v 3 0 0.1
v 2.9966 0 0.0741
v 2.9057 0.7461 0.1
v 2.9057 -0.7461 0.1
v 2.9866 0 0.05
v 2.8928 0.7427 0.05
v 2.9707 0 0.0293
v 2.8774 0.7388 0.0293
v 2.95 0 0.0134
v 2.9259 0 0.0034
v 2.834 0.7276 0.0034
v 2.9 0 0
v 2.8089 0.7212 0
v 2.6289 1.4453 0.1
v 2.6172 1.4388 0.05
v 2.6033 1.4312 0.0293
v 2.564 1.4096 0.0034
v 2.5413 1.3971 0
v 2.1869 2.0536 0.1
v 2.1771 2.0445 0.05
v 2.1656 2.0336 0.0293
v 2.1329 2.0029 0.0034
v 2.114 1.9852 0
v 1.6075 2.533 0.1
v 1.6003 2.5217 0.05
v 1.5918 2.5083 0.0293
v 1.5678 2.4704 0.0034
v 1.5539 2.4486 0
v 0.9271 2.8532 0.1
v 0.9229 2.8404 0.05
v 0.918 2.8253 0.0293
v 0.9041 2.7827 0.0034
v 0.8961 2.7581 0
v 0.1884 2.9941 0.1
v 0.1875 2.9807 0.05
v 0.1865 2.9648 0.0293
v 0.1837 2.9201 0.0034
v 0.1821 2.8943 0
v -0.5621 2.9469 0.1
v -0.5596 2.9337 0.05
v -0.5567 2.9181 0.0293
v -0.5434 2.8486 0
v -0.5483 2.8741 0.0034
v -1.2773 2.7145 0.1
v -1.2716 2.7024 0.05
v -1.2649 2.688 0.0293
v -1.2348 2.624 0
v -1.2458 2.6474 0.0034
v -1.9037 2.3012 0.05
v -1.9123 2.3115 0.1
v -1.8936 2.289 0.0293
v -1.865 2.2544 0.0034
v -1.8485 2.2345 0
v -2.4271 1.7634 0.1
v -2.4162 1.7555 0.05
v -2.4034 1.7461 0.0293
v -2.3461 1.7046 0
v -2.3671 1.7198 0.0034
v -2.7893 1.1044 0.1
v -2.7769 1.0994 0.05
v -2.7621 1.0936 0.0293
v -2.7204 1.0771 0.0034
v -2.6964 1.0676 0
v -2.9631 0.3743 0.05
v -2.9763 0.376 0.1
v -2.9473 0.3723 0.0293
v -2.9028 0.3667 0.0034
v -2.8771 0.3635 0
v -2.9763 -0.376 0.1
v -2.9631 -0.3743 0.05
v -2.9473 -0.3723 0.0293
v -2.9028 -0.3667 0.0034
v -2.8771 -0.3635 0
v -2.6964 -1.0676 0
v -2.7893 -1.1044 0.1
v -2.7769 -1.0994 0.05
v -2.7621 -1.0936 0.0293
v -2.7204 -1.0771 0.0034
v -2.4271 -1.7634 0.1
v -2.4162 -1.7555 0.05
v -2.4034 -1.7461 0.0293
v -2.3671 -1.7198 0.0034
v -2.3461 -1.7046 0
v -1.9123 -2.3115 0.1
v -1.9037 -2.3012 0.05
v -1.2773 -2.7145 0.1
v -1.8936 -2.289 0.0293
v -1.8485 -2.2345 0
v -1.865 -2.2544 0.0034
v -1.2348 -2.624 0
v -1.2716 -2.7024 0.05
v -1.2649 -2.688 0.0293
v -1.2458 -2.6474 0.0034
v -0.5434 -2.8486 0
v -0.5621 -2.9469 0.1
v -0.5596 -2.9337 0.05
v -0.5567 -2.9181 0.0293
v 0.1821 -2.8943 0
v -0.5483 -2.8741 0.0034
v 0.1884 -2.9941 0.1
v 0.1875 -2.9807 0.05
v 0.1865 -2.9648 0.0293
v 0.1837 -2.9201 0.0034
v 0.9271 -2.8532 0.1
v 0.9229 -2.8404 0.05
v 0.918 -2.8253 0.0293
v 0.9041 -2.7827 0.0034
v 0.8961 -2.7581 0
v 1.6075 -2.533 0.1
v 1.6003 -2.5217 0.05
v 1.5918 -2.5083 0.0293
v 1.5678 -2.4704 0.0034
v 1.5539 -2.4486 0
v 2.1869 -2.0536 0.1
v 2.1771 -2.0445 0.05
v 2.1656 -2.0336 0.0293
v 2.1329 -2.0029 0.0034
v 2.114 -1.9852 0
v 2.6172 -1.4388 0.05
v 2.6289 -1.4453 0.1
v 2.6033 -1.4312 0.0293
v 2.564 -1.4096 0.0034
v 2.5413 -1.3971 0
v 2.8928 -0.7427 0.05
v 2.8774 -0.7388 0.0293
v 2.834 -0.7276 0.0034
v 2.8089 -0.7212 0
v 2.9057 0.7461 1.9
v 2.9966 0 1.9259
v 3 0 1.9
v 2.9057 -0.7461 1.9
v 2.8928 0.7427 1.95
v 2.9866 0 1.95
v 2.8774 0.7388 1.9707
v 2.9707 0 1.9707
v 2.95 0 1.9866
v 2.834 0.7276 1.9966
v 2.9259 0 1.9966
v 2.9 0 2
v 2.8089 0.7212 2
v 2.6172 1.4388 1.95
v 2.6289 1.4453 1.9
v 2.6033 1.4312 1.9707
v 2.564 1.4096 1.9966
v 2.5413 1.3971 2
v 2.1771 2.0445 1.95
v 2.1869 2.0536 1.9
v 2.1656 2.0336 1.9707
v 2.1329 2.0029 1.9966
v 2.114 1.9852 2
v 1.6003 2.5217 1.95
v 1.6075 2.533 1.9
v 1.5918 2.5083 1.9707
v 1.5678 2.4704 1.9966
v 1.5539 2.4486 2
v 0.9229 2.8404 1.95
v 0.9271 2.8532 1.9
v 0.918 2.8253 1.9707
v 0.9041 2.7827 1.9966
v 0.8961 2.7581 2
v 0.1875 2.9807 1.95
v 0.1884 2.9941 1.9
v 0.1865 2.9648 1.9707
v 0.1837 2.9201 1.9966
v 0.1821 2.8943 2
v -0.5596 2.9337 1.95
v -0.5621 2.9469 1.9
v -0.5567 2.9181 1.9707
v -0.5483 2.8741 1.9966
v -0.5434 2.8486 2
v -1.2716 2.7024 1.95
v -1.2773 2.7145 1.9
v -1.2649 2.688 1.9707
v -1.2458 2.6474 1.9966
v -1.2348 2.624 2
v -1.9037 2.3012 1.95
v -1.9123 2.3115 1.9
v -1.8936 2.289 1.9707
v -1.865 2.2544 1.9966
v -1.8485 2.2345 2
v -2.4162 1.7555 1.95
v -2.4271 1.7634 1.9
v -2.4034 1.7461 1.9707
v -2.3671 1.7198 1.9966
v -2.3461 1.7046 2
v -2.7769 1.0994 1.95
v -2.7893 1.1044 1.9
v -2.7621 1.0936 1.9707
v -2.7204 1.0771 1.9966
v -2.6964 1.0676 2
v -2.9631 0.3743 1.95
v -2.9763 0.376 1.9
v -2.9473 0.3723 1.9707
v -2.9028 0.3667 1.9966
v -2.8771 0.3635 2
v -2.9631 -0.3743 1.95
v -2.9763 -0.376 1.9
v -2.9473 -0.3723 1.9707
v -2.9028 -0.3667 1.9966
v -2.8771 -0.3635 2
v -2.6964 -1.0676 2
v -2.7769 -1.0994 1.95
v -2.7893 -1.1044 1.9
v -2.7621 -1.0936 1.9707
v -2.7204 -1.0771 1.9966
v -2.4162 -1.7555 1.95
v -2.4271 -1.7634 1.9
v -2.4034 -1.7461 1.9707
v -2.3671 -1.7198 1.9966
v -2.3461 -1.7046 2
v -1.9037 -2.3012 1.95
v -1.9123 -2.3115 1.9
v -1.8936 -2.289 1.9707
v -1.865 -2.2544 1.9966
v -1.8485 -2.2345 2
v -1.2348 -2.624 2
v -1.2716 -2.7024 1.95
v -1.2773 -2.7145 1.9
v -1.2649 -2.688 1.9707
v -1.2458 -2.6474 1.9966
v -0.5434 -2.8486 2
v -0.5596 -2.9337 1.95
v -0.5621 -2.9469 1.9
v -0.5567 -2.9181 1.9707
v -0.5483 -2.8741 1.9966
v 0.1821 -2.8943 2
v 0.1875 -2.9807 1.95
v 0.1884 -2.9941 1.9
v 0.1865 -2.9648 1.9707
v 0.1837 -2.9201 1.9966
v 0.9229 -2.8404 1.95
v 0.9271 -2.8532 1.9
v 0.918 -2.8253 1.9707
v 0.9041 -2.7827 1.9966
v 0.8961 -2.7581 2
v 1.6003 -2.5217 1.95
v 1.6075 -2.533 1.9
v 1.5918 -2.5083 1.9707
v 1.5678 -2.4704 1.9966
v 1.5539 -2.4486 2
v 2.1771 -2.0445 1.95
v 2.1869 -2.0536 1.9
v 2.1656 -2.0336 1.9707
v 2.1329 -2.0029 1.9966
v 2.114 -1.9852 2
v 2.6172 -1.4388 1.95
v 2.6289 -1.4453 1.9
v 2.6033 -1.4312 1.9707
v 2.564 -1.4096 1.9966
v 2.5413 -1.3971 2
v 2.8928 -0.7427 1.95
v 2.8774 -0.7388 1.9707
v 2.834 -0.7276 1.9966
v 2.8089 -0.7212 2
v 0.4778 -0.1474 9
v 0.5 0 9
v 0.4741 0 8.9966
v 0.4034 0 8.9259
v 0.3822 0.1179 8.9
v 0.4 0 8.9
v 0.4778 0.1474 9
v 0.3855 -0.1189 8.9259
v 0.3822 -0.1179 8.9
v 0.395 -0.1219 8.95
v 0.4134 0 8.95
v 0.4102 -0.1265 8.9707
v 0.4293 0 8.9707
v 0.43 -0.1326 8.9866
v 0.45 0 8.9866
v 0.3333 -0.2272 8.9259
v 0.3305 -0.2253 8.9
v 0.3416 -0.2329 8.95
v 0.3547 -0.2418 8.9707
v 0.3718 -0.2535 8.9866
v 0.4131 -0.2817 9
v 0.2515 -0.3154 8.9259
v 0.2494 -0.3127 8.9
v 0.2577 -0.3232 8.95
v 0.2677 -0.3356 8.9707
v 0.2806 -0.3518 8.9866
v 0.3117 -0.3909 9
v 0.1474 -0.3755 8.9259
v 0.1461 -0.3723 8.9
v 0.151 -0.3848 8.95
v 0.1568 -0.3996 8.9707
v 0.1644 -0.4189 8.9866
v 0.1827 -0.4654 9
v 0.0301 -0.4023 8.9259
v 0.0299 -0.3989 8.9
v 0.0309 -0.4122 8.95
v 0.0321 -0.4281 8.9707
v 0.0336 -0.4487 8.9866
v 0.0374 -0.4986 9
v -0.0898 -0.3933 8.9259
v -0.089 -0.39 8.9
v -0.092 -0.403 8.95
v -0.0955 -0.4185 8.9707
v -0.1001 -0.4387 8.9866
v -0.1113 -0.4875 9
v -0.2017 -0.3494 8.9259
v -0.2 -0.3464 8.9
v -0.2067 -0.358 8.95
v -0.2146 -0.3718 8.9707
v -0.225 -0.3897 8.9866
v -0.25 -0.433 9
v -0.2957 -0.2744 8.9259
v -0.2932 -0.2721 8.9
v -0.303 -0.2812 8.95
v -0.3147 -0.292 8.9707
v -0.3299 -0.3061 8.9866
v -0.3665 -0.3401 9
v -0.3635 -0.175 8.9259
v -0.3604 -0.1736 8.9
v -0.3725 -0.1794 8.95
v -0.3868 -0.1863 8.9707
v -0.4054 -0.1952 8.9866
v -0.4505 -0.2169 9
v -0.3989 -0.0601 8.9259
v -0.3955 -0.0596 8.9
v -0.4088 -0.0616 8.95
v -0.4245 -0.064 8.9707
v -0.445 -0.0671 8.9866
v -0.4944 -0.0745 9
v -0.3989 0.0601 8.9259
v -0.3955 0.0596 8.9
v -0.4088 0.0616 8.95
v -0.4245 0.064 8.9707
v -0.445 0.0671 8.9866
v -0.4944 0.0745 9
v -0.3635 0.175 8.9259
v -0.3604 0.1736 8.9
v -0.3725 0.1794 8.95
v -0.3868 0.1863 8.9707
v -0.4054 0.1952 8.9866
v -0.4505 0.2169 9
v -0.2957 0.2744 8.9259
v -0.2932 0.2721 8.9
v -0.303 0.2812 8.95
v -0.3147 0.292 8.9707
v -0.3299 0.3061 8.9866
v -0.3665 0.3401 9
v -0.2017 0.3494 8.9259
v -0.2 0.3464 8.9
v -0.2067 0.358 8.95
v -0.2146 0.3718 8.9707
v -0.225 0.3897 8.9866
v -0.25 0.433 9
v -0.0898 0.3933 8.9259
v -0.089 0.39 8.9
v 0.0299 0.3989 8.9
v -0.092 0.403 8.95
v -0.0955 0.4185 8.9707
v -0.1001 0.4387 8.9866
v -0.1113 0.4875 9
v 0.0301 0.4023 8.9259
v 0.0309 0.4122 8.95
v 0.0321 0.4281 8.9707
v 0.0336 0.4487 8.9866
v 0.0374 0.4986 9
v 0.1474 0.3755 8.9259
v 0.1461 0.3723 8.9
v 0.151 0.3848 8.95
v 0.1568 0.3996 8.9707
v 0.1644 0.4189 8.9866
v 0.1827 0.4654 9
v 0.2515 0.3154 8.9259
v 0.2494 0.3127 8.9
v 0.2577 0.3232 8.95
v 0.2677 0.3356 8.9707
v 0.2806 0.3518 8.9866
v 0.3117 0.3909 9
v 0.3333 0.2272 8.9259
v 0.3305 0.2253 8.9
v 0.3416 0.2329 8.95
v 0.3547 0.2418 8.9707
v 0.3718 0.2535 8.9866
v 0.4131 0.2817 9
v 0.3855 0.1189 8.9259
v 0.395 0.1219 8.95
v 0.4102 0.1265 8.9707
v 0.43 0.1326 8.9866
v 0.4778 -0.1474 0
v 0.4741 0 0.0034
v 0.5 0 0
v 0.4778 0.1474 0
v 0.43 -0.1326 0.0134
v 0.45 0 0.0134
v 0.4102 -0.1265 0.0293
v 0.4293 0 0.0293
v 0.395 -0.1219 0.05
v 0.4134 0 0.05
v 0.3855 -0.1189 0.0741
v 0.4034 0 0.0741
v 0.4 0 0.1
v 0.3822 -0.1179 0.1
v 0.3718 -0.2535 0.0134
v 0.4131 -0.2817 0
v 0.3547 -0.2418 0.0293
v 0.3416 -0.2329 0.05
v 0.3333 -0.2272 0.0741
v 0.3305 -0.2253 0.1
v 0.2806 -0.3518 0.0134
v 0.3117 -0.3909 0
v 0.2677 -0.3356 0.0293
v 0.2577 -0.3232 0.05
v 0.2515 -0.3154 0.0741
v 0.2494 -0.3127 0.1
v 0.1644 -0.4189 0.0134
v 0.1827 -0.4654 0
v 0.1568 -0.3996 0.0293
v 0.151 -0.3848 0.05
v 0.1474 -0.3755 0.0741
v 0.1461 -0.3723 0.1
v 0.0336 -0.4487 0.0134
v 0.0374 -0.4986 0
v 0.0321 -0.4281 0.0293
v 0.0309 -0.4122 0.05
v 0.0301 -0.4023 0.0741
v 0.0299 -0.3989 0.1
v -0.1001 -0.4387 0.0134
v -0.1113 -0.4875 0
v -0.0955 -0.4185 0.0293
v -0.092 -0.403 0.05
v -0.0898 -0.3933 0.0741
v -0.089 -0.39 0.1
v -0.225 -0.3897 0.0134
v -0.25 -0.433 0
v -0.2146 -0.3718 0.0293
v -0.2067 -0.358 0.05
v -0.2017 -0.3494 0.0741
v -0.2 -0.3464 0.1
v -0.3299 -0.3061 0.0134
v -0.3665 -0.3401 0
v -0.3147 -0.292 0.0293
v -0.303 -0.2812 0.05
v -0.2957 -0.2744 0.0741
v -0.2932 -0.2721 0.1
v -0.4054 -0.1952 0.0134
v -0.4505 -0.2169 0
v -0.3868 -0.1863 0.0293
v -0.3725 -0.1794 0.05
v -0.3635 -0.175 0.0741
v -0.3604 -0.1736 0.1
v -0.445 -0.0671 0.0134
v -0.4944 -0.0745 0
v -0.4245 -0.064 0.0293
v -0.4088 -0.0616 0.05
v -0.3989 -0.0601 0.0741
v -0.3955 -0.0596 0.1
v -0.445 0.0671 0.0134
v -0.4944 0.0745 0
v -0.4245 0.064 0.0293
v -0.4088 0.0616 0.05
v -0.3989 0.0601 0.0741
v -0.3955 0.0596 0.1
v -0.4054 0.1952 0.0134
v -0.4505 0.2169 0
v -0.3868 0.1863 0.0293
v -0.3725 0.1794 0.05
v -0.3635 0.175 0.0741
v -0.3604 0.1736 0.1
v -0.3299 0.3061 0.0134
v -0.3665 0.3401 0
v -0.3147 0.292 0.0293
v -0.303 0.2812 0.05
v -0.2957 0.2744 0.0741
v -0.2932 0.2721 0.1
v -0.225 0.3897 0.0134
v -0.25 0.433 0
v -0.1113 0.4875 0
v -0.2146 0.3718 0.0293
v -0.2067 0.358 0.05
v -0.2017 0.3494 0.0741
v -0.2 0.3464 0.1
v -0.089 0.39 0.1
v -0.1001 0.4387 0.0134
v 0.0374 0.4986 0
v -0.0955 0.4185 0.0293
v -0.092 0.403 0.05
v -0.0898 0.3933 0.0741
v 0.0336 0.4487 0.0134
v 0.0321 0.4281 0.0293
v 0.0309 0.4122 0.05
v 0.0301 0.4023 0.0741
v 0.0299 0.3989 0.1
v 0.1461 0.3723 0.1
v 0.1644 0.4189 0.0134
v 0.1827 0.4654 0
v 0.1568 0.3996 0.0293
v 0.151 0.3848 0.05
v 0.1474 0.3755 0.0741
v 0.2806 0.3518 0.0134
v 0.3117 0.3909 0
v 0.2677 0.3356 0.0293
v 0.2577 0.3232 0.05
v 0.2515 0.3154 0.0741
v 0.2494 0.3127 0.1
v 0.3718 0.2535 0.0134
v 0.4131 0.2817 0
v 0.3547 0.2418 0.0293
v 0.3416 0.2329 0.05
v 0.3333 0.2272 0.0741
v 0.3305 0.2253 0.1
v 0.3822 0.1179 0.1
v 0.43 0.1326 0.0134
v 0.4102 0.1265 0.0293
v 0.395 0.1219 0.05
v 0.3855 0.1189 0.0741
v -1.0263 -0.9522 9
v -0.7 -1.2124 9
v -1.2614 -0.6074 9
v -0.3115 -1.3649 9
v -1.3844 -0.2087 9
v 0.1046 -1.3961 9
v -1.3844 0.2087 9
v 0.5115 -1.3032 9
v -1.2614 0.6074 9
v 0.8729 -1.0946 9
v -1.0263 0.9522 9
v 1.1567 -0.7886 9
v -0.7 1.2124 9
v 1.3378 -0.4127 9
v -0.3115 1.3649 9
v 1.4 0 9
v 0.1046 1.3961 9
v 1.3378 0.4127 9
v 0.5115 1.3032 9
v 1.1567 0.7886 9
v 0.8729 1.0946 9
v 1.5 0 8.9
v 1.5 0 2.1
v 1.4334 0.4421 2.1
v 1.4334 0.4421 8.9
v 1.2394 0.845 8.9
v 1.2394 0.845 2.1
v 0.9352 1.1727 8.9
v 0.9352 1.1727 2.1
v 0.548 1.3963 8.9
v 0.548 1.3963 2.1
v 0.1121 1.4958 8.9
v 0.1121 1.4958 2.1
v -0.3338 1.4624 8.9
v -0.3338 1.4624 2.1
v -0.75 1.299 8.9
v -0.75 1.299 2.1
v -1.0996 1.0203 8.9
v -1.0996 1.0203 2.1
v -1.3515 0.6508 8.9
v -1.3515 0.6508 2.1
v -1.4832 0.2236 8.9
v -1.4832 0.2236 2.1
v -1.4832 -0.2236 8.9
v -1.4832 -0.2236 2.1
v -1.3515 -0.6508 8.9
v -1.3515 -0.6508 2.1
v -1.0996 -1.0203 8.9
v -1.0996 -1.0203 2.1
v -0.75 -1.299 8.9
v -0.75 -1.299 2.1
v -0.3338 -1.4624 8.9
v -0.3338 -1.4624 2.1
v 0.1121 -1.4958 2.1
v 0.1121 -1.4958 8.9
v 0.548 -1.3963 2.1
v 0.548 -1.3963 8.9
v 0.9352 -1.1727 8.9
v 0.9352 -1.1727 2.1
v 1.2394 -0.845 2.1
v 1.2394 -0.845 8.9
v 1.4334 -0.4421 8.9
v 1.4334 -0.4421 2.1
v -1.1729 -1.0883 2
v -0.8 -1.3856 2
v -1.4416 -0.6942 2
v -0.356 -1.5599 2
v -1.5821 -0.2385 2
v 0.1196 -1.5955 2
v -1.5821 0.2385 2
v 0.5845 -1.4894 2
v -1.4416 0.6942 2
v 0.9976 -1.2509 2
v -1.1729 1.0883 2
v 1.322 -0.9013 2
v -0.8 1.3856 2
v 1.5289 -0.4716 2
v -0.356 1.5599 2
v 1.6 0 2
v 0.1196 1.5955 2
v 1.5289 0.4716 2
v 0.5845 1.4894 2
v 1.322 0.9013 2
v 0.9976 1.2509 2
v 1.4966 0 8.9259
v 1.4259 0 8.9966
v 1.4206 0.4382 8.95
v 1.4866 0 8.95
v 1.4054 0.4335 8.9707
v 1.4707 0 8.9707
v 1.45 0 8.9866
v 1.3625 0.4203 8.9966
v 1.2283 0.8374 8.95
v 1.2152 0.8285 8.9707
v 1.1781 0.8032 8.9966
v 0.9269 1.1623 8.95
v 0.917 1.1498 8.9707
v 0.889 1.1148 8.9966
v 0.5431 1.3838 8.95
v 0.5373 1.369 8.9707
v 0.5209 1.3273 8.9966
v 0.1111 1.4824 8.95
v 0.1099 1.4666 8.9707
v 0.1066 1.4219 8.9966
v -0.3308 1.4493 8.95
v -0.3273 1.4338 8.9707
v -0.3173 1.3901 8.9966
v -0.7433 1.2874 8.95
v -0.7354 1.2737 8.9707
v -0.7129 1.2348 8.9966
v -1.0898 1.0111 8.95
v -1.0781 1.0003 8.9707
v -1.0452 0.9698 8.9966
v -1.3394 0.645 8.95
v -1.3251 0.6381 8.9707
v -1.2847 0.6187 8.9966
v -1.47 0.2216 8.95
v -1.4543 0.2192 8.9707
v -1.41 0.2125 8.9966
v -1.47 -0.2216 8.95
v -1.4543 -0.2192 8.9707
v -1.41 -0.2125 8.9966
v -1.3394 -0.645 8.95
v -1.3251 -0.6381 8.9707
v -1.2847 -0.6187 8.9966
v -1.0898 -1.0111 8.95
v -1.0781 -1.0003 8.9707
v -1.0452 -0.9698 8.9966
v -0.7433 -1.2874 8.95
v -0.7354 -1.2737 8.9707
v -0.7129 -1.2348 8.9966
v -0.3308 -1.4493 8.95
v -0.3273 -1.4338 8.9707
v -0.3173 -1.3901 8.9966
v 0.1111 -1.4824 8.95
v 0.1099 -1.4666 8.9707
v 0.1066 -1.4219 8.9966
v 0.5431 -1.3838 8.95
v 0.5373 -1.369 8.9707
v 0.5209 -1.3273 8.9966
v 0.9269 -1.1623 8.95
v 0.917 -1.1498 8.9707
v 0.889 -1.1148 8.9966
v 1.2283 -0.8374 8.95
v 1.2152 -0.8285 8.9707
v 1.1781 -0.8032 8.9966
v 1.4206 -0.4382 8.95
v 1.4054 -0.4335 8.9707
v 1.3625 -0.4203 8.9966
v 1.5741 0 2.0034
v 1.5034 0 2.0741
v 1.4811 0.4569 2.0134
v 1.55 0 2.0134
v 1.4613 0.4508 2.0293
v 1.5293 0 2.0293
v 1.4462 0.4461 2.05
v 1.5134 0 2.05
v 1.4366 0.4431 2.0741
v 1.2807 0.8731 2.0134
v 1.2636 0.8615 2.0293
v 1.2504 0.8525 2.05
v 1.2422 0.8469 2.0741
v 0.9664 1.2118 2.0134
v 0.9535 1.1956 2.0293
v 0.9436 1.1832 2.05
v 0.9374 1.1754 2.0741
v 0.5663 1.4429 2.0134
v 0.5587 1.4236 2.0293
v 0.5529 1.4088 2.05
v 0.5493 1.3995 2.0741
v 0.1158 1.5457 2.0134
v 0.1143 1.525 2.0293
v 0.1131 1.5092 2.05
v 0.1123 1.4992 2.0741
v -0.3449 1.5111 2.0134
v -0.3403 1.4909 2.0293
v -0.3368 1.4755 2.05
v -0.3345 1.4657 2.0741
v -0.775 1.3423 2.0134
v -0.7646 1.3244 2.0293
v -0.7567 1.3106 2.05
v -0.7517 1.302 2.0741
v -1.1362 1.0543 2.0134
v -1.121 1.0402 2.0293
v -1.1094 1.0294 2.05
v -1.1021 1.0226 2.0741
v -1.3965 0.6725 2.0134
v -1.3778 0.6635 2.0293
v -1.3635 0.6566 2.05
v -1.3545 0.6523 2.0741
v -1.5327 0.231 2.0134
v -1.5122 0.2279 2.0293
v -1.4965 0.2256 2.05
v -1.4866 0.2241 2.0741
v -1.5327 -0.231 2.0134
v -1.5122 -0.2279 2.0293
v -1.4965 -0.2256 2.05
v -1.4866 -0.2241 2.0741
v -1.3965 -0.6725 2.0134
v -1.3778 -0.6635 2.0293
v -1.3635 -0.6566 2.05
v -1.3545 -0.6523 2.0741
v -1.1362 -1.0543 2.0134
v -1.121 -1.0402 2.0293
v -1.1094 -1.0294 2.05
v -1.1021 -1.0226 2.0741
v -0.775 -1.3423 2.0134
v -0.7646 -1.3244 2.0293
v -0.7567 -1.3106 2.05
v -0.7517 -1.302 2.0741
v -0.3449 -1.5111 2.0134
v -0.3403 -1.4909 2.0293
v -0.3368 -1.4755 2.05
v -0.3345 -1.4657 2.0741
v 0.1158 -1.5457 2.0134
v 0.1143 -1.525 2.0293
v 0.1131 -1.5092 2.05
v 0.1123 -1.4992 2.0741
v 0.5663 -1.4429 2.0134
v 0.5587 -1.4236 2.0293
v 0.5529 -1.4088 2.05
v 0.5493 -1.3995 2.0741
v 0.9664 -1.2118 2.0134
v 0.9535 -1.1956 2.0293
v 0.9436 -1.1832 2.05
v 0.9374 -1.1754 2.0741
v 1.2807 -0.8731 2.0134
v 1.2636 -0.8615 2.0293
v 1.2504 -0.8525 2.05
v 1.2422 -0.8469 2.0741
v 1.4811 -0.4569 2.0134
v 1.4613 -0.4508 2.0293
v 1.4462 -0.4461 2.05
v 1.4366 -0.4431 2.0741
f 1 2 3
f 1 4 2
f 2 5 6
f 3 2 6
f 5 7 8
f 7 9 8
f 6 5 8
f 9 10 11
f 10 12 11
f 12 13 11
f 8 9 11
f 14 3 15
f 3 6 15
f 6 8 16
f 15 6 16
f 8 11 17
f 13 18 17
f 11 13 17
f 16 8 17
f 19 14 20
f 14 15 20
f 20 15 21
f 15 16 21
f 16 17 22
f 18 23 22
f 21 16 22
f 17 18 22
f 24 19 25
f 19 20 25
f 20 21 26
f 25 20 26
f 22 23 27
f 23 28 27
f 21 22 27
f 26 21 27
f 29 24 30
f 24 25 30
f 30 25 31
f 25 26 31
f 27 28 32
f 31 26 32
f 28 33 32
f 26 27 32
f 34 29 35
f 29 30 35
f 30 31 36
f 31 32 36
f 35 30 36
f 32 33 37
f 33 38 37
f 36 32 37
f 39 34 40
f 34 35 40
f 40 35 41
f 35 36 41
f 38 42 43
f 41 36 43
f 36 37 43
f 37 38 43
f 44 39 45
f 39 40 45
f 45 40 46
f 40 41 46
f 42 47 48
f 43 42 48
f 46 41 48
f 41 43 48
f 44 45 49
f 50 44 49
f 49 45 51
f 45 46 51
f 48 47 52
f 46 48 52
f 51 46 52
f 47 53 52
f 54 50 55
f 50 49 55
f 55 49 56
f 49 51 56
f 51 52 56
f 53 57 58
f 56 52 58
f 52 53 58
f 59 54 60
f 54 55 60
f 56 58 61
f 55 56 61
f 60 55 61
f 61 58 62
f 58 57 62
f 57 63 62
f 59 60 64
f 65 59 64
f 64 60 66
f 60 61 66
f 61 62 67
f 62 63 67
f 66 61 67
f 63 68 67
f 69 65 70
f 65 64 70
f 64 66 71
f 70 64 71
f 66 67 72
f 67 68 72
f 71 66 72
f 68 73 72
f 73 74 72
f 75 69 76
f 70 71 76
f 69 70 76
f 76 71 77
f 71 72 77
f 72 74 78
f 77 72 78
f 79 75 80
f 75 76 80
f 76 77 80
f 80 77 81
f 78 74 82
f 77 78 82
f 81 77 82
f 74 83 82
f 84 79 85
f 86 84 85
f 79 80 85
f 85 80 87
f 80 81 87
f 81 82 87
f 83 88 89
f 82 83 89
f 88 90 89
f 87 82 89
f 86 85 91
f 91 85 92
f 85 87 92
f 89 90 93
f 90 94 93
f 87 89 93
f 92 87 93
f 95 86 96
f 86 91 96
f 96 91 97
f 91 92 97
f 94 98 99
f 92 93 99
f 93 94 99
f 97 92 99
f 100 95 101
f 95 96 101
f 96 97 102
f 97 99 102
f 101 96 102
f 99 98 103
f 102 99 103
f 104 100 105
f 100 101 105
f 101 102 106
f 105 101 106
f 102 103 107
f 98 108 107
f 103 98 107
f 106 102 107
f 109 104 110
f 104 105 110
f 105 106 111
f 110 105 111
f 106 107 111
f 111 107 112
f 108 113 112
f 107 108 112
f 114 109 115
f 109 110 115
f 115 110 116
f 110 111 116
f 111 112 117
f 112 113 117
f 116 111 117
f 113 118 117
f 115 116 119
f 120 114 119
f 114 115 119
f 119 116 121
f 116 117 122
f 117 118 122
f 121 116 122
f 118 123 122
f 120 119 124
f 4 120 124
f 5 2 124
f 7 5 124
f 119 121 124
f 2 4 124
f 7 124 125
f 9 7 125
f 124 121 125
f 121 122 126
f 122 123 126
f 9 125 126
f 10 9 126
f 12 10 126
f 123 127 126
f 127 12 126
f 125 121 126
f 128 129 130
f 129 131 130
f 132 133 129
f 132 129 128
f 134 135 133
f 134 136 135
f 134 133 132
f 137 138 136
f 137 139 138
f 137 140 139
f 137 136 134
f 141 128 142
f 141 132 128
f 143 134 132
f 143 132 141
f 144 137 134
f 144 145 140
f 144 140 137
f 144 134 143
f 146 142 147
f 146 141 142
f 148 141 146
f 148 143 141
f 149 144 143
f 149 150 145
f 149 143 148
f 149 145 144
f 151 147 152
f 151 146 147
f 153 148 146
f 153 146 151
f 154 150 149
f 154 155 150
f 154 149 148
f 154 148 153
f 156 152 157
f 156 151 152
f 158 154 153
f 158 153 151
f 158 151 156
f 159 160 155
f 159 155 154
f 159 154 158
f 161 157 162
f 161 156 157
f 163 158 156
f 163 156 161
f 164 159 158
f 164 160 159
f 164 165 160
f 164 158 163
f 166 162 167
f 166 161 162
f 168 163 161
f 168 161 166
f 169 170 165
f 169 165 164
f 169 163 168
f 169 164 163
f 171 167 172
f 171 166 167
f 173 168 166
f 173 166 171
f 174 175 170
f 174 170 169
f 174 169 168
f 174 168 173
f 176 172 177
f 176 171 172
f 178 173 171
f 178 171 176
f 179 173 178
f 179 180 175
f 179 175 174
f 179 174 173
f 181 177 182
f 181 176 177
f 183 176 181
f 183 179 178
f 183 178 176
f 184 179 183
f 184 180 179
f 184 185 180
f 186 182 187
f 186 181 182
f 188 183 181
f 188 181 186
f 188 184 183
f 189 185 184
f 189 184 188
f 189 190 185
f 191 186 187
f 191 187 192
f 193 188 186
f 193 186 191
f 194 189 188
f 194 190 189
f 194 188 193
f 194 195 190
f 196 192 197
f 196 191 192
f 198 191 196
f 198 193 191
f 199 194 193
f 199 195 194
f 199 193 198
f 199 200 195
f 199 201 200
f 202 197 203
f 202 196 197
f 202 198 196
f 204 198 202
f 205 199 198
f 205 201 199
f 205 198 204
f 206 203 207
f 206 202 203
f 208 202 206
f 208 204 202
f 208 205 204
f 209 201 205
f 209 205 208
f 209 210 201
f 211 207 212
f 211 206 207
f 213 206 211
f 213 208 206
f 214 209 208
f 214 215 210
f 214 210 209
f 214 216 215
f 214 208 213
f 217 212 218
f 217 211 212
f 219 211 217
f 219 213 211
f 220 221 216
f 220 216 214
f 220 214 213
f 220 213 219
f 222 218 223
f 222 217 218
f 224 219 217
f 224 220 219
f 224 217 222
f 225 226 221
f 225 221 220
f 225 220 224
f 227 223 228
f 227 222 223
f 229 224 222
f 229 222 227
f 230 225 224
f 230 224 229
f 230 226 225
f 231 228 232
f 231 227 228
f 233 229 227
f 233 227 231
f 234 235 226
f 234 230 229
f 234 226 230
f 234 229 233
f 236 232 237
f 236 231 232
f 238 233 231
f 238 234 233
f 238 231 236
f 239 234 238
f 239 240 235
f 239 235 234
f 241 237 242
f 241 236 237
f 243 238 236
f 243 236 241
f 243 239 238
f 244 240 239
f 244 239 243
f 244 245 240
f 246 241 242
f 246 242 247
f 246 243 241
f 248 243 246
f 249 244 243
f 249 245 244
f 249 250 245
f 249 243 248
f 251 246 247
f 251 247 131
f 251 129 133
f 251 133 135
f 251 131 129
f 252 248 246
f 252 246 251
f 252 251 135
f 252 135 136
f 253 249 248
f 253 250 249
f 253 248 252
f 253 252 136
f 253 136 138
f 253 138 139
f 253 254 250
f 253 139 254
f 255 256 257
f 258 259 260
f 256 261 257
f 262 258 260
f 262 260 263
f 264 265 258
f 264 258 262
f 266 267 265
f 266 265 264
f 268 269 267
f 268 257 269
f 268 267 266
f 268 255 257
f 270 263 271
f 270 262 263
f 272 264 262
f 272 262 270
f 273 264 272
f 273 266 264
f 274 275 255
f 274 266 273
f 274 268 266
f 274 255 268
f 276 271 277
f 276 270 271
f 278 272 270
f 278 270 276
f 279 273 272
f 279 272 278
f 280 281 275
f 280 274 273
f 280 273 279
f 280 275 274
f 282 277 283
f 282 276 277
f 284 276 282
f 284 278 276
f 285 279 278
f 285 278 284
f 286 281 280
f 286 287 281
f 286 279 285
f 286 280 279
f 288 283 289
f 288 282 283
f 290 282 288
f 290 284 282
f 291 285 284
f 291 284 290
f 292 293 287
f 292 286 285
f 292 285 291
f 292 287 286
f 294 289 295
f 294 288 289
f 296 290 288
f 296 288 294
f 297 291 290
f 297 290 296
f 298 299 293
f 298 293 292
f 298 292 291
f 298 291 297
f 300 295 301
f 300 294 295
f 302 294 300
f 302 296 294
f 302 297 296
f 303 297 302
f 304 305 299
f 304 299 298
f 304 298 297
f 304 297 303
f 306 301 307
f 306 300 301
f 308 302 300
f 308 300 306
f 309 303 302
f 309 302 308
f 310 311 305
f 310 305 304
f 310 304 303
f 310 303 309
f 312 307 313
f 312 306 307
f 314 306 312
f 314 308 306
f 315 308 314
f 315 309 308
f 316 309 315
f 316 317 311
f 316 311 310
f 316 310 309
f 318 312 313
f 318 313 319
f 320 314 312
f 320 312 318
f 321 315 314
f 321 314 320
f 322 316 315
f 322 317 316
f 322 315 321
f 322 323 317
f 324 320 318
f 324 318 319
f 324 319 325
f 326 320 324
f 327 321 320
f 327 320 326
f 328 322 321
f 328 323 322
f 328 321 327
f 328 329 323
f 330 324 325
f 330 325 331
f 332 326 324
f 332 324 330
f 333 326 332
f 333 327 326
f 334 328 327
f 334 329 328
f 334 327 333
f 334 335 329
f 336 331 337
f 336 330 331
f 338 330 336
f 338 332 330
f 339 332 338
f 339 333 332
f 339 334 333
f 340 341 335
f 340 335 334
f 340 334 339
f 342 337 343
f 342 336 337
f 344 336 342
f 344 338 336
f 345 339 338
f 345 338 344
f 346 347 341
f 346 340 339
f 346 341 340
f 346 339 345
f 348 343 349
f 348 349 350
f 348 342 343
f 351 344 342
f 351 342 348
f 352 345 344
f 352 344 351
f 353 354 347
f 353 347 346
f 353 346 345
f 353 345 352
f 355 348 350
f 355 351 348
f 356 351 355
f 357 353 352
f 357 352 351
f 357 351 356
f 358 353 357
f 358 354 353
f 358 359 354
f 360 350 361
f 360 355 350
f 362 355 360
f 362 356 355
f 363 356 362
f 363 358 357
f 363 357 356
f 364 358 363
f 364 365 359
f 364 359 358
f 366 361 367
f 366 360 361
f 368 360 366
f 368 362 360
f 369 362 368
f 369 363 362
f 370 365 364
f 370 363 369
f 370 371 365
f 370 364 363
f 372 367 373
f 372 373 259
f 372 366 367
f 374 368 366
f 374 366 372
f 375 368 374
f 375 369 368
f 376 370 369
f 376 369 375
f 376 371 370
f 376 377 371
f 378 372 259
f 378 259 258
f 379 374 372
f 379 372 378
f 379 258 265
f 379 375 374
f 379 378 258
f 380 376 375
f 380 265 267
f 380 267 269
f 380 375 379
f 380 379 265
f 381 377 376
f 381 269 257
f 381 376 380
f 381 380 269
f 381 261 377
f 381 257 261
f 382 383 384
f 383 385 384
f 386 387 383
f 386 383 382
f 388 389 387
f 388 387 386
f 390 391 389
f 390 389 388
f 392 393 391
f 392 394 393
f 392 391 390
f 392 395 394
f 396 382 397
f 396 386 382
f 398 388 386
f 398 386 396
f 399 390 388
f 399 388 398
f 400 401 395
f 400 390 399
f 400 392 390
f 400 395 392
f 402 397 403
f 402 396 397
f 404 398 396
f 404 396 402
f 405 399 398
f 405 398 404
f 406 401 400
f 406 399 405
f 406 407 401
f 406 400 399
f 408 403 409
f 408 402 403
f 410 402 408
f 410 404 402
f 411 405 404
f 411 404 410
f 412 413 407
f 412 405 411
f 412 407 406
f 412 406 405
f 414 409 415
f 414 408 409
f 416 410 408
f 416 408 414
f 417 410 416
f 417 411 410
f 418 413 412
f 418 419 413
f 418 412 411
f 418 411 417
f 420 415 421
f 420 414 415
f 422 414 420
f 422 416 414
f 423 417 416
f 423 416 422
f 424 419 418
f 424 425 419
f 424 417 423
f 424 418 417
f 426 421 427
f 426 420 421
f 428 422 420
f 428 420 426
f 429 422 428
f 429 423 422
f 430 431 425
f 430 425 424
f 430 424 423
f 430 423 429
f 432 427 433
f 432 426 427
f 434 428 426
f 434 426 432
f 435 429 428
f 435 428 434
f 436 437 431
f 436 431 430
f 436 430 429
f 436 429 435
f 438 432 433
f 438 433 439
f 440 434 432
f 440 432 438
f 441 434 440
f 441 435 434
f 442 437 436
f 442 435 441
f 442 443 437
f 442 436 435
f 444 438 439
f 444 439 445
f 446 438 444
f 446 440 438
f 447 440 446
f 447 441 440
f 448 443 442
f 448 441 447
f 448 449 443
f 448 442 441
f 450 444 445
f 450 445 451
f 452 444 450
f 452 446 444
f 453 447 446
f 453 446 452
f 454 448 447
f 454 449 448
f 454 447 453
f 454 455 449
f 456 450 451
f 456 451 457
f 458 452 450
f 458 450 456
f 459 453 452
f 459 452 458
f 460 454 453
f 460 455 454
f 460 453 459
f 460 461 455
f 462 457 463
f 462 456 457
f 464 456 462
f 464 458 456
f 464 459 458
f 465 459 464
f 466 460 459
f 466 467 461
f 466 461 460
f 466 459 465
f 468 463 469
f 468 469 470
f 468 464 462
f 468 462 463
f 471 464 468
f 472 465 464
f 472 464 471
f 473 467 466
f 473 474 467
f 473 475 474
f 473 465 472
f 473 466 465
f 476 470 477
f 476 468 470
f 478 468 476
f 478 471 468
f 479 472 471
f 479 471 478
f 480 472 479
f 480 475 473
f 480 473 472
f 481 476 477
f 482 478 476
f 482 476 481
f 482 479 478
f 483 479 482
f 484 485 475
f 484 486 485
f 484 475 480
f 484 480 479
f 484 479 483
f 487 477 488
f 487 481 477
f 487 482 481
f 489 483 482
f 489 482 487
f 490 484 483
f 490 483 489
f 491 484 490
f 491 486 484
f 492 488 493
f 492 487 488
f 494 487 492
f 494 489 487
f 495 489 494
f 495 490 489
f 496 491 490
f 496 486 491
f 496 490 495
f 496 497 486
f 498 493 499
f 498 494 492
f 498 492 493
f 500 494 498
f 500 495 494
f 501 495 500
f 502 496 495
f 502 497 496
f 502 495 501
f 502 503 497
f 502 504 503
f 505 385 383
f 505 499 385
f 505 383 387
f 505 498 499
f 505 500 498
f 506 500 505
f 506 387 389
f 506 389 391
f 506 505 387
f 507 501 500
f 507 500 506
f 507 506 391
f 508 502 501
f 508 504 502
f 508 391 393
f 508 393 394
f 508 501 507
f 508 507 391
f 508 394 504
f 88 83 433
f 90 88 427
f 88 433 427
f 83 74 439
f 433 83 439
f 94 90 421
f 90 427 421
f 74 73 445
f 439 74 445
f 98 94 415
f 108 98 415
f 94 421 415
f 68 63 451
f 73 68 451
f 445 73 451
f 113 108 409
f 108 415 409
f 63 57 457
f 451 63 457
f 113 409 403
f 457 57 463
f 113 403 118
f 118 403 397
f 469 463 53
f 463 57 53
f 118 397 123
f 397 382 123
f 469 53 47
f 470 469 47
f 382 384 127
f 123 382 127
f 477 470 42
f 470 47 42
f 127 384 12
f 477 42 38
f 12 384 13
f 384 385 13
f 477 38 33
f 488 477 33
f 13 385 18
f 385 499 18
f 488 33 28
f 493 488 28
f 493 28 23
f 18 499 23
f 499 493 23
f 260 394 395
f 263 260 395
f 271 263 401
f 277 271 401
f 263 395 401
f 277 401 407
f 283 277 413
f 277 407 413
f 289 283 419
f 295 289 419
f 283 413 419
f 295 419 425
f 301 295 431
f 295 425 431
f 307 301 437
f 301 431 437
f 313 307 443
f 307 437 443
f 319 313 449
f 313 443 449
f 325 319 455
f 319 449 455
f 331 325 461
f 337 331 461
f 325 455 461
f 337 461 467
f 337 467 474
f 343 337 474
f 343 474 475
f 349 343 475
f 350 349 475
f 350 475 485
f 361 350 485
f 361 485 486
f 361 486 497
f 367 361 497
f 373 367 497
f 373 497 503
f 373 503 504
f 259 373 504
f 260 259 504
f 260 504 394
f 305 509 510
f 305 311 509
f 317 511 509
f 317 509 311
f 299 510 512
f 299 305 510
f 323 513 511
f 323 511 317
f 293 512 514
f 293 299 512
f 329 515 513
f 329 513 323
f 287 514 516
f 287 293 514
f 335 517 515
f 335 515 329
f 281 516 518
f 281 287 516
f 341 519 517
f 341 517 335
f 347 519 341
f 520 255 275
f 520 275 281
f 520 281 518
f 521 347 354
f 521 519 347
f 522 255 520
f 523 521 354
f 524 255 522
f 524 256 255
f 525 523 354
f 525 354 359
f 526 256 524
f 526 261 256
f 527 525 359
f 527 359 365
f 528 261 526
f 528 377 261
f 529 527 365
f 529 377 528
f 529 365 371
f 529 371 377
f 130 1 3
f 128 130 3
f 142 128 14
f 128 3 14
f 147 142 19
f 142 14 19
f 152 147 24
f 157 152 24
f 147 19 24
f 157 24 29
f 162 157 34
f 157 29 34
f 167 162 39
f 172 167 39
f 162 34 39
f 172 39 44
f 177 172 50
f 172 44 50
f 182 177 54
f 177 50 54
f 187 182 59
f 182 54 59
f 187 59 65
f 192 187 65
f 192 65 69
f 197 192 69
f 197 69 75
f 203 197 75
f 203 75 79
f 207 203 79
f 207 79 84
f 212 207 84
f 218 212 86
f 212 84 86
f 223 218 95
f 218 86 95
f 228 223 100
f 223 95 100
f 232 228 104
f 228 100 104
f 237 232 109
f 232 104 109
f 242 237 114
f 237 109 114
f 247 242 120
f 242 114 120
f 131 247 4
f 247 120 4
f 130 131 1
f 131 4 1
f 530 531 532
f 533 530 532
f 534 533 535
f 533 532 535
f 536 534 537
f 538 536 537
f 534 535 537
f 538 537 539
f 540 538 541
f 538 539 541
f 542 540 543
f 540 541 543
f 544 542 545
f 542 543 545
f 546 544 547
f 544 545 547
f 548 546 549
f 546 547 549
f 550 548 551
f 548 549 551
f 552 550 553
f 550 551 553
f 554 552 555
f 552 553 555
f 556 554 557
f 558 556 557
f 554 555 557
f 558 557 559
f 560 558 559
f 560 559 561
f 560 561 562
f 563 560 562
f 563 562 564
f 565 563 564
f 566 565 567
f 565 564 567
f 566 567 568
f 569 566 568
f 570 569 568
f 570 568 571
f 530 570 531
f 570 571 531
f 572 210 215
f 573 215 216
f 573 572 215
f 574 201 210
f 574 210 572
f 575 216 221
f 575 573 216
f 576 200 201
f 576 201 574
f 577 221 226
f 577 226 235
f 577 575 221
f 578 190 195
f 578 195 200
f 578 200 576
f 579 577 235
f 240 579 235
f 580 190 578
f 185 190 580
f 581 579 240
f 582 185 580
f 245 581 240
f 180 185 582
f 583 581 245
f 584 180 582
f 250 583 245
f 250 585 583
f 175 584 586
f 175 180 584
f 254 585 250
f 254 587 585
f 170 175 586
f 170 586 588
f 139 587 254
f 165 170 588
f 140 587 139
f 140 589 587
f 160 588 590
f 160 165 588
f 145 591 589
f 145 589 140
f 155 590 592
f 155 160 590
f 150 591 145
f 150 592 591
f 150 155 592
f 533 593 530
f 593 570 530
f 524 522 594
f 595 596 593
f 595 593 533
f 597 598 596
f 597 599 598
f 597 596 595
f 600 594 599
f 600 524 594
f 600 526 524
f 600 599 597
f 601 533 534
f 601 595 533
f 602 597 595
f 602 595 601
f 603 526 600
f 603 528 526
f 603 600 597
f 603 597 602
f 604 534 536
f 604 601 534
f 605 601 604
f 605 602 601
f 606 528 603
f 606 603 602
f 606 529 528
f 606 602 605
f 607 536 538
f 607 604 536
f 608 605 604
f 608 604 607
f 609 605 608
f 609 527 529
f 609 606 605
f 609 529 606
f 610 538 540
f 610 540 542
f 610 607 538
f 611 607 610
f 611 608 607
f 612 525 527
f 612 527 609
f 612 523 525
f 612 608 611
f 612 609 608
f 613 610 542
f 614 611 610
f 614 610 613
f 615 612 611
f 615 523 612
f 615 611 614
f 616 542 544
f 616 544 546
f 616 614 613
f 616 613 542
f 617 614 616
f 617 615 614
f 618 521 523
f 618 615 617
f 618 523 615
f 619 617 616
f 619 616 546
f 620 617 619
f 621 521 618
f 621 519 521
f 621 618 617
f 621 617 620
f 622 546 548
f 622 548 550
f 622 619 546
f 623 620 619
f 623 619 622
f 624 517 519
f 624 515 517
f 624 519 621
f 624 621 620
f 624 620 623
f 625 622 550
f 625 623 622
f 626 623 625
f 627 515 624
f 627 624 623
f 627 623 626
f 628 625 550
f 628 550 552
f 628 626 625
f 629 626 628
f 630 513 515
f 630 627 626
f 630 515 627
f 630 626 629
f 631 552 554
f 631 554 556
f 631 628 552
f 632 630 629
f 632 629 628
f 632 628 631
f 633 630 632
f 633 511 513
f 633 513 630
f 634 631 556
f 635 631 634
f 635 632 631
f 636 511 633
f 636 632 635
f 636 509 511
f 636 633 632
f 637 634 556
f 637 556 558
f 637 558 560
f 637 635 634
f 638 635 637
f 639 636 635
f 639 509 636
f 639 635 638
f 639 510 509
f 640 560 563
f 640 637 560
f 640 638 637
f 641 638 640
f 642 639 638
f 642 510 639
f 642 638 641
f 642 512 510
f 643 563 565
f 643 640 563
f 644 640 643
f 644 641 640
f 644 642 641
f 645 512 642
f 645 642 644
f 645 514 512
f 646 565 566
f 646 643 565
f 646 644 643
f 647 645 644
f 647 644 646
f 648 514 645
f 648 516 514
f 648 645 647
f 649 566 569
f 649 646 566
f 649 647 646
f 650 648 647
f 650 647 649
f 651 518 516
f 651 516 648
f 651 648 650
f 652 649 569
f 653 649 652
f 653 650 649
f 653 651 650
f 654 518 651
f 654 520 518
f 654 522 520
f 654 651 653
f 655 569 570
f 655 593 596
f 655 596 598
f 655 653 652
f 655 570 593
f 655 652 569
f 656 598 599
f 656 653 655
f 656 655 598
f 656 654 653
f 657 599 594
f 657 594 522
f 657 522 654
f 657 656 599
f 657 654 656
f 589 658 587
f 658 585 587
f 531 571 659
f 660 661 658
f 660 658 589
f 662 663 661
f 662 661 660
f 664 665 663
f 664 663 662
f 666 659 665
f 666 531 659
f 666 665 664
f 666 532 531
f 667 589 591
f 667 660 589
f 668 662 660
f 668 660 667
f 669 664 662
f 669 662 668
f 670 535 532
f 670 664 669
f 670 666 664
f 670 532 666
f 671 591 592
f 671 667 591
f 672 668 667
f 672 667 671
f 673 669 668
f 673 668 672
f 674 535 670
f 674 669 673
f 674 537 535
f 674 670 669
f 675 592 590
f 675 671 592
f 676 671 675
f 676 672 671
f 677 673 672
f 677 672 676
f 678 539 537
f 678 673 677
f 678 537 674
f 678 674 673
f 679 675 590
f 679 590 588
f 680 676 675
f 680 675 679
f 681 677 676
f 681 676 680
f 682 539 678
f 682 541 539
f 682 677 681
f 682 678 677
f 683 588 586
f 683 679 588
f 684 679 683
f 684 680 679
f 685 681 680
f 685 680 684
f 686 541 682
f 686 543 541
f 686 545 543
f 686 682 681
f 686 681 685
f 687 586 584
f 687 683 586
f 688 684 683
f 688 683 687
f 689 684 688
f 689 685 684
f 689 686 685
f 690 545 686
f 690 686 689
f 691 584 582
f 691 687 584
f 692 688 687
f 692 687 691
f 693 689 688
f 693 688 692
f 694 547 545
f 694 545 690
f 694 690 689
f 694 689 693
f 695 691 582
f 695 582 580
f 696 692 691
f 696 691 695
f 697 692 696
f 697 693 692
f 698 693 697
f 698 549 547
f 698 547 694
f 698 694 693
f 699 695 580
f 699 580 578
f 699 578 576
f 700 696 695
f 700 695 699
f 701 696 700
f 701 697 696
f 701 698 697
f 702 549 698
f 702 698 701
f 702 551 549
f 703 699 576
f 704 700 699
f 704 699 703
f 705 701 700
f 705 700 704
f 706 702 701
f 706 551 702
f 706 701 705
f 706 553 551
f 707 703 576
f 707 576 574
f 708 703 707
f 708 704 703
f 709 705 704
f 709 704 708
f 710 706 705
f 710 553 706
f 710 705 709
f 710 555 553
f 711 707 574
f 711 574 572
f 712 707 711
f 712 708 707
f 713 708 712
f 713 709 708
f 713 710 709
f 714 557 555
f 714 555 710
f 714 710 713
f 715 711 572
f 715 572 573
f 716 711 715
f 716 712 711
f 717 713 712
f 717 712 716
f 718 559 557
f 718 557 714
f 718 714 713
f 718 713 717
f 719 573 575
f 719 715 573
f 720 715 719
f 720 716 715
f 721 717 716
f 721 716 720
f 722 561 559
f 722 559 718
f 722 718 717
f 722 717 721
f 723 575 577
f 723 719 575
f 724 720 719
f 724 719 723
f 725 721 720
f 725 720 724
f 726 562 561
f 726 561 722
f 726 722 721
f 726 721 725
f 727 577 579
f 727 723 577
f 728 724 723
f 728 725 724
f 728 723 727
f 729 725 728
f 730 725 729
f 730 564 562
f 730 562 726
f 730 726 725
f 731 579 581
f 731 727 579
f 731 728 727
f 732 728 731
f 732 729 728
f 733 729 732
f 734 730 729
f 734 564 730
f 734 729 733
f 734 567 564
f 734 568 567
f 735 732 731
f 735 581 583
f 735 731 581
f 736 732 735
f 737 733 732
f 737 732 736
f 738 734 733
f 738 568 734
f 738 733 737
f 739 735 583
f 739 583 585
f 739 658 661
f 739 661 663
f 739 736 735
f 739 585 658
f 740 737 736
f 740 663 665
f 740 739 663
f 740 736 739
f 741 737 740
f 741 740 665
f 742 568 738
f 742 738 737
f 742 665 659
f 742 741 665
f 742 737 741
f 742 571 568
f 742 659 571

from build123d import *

# Parameters (mm, degrees)
F0_R     = 3
F1_DEPTH = 2
F2_R     = 1.5
F3_DEPTH = 7
F4_R     = 0.4
F5_DEPTH = 9.001
F6_R     = 0.1


with BuildPart() as f1:
    # F0 (on Top) → F1 (new body)
    with BuildSketch(Plane.XY):
        Circle(F0_R)
    extrude(amount=F1_DEPTH)

    # F2 (on face) → F3 (join)
    with BuildSketch(Plane.XY.offset(2)):
        Circle(F2_R)
    extrude(amount=F3_DEPTH)

    # F4 (on face) → F5 (cut, through all)
    with BuildSketch(Plane(origin=(0, 0, 0), x_dir=(1, 0, 0), z_dir=(0, 0, -1))):
        Circle(F4_R)
    extrude(amount=-F5_DEPTH, mode=Mode.SUBTRACT)

    # F6
    f6_edges = [f1.edges().sort_by_distance(p)[0] for p in [
        (-0.4, 0, 9),
        (-0.4, 0, 0),
        (-3, 0, 0),
        (-3, 0, 2),
        (-1.5, 0, 2),
        (-1.5, 0, 9),
    ]]
    fillet(f6_edges, radius=F6_R)


solid = f1.part
